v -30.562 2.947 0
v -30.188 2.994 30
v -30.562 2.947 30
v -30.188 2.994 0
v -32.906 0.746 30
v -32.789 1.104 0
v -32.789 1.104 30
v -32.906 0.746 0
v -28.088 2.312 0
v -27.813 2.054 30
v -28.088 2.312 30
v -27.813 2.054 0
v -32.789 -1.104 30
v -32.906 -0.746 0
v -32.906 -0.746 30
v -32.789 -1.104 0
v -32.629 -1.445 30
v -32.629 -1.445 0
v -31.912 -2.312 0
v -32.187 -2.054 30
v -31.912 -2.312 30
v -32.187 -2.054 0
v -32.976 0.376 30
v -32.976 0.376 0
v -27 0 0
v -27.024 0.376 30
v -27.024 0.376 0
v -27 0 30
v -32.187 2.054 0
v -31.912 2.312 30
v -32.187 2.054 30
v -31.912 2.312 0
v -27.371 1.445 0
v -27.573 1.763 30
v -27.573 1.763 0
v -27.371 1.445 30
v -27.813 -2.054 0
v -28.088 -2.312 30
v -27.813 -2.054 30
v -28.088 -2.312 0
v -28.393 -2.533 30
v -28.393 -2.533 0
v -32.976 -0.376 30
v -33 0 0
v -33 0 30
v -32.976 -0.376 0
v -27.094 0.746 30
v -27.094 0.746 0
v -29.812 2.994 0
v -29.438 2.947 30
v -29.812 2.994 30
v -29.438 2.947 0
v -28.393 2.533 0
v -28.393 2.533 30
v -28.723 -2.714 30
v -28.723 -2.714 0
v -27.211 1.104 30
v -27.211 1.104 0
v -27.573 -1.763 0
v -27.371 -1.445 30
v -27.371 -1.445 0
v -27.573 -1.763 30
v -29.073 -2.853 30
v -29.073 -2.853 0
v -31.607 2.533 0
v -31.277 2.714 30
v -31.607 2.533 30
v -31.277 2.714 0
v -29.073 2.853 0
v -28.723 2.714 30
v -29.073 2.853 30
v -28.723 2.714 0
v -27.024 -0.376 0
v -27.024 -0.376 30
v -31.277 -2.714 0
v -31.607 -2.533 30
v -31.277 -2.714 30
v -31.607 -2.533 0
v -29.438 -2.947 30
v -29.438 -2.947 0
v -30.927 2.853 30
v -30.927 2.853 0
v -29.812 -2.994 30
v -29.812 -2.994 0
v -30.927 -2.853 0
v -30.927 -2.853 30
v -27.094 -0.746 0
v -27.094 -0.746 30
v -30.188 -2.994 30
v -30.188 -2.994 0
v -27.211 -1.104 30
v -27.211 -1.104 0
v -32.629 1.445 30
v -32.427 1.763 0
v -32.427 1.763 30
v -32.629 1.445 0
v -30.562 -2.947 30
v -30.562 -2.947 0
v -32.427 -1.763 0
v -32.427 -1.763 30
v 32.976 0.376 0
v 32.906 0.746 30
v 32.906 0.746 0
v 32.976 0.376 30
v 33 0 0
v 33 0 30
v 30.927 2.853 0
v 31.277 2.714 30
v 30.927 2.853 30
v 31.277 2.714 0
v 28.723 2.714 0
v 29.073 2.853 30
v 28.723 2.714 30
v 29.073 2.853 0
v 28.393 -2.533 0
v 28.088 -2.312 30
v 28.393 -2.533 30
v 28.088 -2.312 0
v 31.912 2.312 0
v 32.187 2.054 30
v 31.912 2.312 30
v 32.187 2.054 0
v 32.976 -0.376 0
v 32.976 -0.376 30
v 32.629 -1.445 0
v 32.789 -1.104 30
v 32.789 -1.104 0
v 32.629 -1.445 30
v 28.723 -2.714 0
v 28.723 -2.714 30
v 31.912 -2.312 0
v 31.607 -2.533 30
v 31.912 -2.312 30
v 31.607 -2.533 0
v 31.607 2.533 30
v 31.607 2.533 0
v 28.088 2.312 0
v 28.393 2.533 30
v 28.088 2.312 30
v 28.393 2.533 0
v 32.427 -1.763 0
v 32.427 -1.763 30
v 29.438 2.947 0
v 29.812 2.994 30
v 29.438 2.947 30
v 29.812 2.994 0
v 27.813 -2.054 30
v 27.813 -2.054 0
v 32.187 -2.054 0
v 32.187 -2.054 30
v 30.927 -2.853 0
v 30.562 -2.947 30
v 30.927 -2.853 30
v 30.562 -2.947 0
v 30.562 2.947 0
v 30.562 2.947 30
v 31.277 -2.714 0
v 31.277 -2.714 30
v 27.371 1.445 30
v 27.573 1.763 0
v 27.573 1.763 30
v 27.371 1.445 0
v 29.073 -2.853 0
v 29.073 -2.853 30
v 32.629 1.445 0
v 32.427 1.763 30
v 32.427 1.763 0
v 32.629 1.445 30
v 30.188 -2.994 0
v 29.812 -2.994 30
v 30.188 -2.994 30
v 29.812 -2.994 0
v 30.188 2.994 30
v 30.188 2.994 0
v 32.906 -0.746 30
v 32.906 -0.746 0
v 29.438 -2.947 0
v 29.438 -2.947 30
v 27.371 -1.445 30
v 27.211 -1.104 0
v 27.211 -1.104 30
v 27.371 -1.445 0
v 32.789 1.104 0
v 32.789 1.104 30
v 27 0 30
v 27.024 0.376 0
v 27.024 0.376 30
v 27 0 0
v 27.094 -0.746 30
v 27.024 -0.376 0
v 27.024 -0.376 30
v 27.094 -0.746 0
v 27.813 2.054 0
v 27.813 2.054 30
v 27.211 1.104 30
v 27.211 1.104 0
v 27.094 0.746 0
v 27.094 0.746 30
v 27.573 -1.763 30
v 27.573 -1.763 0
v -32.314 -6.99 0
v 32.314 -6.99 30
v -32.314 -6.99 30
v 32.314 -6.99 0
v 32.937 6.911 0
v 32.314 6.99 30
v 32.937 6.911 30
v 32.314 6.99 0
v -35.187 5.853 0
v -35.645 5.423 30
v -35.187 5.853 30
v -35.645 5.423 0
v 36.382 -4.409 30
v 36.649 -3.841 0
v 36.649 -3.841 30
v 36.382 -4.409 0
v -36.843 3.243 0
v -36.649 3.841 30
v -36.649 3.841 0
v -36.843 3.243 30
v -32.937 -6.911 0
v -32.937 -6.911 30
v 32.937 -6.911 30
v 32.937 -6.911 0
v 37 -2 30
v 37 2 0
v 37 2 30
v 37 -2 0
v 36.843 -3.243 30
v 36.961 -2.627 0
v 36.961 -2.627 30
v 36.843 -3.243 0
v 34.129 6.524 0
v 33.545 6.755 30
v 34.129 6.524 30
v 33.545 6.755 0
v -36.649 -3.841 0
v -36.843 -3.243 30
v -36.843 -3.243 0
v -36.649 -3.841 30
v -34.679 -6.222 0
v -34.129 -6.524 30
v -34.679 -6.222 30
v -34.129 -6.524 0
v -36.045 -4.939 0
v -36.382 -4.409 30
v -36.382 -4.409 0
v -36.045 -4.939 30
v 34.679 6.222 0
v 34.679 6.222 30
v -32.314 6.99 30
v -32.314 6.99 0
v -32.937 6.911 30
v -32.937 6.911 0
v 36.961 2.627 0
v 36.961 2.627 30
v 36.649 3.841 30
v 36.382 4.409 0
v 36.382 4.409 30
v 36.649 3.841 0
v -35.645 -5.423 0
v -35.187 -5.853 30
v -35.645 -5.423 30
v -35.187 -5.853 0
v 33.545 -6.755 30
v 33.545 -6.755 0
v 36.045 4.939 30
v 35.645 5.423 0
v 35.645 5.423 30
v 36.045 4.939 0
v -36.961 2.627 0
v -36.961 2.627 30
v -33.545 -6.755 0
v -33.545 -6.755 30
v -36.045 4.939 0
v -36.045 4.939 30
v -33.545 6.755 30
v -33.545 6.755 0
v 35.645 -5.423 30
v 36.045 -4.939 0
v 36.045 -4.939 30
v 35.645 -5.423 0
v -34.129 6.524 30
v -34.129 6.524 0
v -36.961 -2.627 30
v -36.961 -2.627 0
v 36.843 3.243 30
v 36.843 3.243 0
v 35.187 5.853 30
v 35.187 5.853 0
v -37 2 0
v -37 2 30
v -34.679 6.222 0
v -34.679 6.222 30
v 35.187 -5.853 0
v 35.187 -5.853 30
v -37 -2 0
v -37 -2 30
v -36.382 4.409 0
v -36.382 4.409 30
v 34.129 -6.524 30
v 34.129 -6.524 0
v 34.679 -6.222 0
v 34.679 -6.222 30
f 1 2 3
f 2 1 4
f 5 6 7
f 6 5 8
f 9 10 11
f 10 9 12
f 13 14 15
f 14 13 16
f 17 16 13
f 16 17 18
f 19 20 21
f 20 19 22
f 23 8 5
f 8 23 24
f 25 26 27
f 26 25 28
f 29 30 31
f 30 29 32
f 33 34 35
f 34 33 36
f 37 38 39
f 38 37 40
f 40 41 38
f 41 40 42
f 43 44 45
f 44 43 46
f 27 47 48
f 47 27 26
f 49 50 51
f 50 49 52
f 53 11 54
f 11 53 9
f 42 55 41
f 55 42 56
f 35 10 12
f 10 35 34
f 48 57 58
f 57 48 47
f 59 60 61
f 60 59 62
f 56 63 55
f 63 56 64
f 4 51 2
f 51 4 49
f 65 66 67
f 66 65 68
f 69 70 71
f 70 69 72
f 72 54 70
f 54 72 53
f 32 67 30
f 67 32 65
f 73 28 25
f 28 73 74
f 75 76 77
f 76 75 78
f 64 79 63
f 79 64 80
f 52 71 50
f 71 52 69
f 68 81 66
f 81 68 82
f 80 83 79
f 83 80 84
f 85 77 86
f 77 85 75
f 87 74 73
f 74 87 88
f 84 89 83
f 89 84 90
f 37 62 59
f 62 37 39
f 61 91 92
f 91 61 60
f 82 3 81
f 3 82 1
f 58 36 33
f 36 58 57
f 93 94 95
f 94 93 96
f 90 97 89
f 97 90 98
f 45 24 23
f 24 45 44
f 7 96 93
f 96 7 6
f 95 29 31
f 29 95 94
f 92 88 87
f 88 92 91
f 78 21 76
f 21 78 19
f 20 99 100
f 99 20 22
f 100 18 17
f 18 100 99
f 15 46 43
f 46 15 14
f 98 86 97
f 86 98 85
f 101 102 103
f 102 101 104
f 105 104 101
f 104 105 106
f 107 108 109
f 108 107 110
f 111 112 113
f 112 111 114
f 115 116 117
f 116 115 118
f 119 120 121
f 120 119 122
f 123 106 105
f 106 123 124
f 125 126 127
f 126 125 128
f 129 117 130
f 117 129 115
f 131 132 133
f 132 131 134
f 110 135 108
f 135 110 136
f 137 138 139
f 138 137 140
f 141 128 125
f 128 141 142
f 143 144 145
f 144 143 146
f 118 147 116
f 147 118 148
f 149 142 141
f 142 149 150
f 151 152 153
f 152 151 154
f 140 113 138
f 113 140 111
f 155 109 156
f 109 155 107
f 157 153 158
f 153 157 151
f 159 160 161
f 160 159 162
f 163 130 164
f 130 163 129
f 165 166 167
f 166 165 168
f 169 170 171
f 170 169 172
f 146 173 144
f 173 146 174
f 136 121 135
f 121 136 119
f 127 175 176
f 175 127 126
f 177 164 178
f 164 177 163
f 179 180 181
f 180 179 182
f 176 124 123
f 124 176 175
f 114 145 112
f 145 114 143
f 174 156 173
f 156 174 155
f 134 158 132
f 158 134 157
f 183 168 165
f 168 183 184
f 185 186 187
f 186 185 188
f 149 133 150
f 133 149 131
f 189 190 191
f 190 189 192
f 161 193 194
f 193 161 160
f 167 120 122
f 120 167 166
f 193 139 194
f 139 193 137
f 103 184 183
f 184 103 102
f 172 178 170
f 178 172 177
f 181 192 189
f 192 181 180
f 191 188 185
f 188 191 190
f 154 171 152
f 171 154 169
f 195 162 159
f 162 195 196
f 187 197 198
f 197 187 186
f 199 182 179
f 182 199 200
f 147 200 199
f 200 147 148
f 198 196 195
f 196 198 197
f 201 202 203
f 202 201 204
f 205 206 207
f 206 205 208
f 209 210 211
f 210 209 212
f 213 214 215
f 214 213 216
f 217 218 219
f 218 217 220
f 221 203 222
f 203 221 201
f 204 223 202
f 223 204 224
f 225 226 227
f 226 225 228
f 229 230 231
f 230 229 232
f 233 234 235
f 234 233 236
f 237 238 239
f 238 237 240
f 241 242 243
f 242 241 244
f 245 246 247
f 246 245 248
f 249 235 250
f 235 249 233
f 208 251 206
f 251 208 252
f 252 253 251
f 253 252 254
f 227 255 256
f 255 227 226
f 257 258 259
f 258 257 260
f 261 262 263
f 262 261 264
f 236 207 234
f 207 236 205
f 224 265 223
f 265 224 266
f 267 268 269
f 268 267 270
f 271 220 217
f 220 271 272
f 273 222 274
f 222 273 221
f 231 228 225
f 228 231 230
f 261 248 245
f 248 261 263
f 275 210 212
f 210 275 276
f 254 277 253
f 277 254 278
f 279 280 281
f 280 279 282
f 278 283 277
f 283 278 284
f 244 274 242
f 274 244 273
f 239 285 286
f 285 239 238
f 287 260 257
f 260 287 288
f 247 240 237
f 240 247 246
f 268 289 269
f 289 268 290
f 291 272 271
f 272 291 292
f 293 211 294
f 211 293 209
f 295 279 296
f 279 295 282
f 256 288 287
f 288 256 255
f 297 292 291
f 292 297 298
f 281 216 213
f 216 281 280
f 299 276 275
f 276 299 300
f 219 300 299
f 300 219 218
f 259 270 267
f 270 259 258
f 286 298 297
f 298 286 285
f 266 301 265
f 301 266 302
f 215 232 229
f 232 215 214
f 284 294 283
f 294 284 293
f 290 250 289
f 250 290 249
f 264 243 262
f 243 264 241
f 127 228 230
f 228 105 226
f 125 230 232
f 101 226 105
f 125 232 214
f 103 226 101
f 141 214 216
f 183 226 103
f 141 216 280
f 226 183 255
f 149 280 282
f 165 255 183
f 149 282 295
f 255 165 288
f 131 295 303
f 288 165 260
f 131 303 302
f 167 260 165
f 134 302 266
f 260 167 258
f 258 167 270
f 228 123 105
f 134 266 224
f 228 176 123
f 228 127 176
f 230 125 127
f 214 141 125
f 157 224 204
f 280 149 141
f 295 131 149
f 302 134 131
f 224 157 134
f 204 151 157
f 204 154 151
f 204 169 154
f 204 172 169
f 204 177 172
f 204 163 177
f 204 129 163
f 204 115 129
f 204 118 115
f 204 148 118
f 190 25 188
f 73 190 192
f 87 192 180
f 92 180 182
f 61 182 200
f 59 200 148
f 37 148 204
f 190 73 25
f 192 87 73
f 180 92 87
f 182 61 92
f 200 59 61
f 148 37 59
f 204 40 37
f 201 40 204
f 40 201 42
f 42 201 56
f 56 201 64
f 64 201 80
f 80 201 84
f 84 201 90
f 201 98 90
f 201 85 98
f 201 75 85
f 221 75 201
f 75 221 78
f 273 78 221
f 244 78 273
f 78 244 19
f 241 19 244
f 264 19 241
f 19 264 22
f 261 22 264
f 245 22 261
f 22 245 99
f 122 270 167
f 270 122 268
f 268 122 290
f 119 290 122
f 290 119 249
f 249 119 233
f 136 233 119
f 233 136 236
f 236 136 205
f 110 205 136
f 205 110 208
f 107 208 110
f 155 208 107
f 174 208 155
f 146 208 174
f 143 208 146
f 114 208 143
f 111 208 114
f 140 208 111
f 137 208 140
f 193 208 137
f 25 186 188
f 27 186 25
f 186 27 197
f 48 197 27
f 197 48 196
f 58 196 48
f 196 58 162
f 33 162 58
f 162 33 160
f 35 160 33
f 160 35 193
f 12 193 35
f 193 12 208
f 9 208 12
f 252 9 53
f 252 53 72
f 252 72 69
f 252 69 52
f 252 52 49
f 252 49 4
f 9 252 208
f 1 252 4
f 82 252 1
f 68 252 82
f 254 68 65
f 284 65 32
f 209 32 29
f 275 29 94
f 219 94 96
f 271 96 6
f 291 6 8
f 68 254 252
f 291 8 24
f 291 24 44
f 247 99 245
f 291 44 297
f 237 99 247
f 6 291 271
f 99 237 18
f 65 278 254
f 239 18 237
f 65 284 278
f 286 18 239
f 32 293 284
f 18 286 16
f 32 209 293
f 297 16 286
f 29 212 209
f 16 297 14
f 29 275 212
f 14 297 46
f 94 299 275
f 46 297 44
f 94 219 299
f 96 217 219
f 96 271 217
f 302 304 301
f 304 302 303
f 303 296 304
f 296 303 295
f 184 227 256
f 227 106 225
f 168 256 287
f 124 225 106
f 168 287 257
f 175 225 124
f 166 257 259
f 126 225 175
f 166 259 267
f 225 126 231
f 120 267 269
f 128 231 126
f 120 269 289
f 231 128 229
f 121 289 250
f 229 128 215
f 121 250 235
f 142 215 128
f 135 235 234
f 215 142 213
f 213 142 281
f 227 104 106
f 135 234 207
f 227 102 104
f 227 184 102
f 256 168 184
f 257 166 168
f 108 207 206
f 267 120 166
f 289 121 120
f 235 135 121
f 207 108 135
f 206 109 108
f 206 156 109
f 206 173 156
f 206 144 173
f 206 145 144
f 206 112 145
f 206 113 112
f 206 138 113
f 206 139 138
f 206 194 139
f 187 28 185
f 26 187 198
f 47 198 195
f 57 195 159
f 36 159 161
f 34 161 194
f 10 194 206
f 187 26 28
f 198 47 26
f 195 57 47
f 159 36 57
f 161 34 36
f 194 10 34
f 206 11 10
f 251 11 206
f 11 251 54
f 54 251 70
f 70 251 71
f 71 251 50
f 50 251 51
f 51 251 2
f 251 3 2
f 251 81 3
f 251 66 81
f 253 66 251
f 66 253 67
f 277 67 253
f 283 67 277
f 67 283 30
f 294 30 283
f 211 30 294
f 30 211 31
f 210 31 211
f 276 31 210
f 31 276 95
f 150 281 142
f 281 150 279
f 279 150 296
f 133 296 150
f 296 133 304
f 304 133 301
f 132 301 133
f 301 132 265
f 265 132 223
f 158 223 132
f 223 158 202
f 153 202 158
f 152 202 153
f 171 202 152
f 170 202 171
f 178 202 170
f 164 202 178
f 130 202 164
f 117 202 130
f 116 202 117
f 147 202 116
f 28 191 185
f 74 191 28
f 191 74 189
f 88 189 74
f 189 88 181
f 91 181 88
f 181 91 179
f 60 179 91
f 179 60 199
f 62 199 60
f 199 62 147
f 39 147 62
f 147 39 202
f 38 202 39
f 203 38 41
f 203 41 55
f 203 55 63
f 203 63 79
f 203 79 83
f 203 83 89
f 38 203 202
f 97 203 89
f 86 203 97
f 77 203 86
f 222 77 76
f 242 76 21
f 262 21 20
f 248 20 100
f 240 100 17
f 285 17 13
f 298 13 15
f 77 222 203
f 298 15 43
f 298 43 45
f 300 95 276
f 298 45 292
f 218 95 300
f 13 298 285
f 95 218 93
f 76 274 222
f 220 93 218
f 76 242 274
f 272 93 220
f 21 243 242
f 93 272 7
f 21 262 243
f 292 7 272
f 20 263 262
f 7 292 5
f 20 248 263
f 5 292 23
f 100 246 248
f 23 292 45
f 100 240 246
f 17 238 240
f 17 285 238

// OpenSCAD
$fn = 50;


difference() {
	union() {
		hull() {
			translate(v = [-32.0000000000, 2.0000000000, 0]) {
				cylinder(h = 30, r = 5);
			}
			translate(v = [32.0000000000, 2.0000000000, 0]) {
				cylinder(h = 30, r = 5);
			}
			translate(v = [-32.0000000000, -2.0000000000, 0]) {
				cylinder(h = 30, r = 5);
			}
			translate(v = [32.0000000000, -2.0000000000, 0]) {
				cylinder(h = 30, r = 5);
			}
		}
	}
	union() {
		translate(v = [-30.0000000000, 0.0000000000, -100.0000000000]) {
			cylinder(h = 200, r = 3.0000000000);
		}
		translate(v = [-30.0000000000, 0.0000000000, -100.0000000000]) {
			cylinder(h = 200, r = 3.0000000000);
		}
		translate(v = [30.0000000000, 0.0000000000, -100.0000000000]) {
			cylinder(h = 200, r = 3.0000000000);
		}
		translate(v = [30.0000000000, 0.0000000000, -100.0000000000]) {
			cylinder(h = 200, r = 3.0000000000);
		}
	}
}
